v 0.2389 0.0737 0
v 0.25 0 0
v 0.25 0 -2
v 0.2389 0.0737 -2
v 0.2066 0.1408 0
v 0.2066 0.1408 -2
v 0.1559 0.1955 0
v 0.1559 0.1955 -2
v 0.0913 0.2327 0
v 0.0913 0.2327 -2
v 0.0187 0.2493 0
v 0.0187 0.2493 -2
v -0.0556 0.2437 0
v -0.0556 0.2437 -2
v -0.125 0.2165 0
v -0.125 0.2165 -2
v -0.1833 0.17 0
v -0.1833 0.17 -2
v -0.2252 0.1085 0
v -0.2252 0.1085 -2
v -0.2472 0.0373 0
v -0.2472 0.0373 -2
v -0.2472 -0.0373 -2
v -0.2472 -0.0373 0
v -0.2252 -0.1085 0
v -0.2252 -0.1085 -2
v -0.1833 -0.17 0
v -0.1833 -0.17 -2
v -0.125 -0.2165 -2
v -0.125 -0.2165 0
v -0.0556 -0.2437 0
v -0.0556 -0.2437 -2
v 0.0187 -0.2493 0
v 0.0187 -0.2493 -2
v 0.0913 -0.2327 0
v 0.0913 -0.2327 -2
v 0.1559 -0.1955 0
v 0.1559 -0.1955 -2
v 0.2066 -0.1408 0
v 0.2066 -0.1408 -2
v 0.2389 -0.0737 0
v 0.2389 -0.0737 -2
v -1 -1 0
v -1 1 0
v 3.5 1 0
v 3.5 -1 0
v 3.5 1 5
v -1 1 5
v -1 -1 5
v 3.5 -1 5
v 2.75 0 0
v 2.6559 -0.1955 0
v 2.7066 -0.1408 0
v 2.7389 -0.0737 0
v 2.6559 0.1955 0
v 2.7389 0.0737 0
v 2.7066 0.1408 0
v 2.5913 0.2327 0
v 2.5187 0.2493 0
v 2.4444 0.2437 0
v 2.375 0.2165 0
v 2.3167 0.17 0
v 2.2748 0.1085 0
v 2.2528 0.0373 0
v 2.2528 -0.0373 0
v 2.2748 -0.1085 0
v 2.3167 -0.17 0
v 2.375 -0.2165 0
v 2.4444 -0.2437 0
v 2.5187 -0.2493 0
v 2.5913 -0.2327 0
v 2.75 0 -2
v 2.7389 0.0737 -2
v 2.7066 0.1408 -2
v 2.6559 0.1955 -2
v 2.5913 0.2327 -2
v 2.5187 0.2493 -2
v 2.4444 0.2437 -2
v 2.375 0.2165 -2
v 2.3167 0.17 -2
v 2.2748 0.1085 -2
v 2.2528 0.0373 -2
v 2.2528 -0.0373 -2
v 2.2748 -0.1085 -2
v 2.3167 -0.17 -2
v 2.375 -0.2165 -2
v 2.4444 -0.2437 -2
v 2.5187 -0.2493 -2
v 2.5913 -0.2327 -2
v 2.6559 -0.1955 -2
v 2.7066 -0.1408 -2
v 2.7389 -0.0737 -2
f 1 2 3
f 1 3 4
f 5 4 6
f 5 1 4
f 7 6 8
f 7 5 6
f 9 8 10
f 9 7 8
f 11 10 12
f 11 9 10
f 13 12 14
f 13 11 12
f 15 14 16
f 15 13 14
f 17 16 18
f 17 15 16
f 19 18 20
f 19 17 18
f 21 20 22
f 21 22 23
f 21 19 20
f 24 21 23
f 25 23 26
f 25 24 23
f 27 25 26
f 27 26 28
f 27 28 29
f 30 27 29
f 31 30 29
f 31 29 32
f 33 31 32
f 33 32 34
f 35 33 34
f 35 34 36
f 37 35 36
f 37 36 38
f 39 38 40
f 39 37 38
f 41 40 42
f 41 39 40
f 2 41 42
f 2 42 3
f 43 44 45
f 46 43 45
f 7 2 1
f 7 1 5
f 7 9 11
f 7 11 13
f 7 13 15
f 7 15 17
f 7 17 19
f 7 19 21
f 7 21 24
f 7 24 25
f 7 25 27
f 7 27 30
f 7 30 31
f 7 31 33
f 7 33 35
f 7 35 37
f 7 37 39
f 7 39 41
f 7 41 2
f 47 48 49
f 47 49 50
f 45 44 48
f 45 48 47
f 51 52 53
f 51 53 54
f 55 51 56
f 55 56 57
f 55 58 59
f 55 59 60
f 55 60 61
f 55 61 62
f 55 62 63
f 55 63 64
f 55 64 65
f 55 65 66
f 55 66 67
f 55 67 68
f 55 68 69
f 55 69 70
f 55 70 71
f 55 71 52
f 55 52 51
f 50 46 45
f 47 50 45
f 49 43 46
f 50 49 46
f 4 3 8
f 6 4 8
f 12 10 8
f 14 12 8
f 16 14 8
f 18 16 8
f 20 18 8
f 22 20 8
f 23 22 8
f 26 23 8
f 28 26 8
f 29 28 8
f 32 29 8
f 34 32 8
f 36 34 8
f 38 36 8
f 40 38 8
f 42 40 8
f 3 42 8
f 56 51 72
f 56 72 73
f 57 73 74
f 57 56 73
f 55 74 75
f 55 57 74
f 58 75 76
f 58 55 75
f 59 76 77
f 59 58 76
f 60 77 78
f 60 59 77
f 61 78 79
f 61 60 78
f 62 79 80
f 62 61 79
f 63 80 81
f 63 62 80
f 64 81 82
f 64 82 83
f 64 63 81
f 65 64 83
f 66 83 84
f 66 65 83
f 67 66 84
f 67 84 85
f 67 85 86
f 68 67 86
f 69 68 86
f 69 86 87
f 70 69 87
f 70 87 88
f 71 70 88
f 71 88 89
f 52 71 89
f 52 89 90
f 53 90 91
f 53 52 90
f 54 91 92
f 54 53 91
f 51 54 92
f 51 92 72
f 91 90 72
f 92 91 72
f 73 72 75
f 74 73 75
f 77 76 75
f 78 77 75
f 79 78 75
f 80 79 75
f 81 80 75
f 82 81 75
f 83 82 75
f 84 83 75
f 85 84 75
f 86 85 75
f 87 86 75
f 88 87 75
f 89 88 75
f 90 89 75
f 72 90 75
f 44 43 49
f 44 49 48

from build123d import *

# Parameters (mm, degrees)
SKETCH1_W               = 4.5
SKETCH1_H               = 2
COMPONENT_OUTLINE_DEPTH = 5
SKETCH2_R               = 0.25
EXTRUDE_1_DEPTH         = 2
SKETCH3_R               = 0.25
EXTRUDE_2_DEPTH         = 2


with BuildPart() as part:
    # Sketch1 → Component_Outline (new body)
    with BuildSketch(Plane.XY):
        with Locations((1.25, 0)):
            Rectangle(SKETCH1_W, SKETCH1_H)
    extrude(amount=COMPONENT_OUTLINE_DEPTH)


with BuildPart() as body_2:
    # Sketch2 → Extrude 1 (new body)
    with BuildSketch(Plane.XY):
        Circle(SKETCH2_R)
    extrude(amount=-EXTRUDE_1_DEPTH)


with BuildPart() as body_3:
    # Sketch3 → Extrude 2 (new body)
    with BuildSketch(Plane.XY):
        with Locations((2.5, 0)):
            Circle(SKETCH3_R)
    extrude(amount=-EXTRUDE_2_DEPTH)


solid = Compound([part.part, body_2.part, body_3.part])
